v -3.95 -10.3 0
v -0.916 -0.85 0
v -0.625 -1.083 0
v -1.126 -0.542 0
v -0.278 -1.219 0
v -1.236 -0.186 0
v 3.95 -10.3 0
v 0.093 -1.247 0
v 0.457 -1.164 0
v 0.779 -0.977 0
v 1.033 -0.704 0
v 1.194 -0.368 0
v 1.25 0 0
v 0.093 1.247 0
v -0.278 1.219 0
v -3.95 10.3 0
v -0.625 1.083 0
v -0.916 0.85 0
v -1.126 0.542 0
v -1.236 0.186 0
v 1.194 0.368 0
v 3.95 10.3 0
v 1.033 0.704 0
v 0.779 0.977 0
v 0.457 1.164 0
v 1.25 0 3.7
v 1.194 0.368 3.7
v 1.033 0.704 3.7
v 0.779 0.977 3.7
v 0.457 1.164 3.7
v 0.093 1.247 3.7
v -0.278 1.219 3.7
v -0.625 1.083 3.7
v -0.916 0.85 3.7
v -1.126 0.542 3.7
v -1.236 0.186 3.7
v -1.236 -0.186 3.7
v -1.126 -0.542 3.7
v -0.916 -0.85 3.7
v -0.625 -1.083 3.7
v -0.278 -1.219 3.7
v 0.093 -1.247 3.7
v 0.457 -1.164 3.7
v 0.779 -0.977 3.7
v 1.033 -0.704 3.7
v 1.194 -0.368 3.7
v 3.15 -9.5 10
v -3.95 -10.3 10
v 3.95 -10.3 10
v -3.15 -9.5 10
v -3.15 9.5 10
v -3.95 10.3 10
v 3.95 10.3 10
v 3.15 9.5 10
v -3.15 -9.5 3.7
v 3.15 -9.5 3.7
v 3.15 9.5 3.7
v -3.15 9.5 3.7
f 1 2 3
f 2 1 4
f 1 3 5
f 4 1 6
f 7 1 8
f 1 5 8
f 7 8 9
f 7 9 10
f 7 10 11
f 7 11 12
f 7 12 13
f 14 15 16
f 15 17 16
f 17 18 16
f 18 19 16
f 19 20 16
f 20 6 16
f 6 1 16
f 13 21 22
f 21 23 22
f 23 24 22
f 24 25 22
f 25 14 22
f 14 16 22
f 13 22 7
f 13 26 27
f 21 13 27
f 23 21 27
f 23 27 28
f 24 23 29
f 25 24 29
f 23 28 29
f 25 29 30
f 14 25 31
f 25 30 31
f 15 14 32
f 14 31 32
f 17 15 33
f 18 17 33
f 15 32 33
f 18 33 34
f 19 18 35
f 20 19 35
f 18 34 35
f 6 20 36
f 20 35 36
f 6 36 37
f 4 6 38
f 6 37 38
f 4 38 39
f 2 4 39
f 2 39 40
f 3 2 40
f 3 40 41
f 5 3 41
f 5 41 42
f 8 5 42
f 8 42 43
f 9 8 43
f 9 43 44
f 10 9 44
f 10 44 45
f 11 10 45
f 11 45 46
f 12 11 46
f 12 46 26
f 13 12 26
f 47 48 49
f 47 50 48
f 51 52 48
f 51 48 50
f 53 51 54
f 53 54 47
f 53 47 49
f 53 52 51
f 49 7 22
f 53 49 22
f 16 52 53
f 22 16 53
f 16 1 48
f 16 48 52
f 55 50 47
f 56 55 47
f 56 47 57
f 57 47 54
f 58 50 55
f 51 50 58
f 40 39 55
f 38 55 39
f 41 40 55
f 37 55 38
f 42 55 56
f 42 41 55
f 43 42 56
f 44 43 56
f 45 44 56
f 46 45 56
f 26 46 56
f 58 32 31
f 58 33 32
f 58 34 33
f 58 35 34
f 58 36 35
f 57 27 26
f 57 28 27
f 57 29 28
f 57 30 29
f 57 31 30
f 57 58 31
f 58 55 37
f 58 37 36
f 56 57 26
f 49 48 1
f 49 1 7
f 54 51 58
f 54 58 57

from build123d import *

# Parameters (mm, degrees)
SKETCH_W        = 7.9
SKETCH_H        = 20.6
PAD_DEPTH       = 10
SKETCH001_W     = 6.3
SKETCH001_H     = 19
POCKET_DEPTH    = 6.3
SKETCH003_R     = 1.25
POCKET001_DEPTH = 10


with BuildPart() as part:
    # Sketch → Pad (new body)
    with BuildSketch(Plane.XY):
        Rectangle(SKETCH_W, SKETCH_H)
    extrude(amount=PAD_DEPTH)

    # Sketch001 (on Face6 of Pad) → Pocket (cut)
    with BuildSketch(Plane.XY.offset(10)):
        Rectangle(SKETCH001_W, SKETCH001_H)
    extrude(amount=-POCKET_DEPTH, mode=Mode.SUBTRACT)

    # Sketch003 (on Face5 of Pocket) → Pocket001 (cut)
    with BuildSketch(Plane.XY.offset(10)):
        Circle(SKETCH003_R)
    extrude(amount=-POCKET001_DEPTH, mode=Mode.SUBTRACT)


solid = part.part
